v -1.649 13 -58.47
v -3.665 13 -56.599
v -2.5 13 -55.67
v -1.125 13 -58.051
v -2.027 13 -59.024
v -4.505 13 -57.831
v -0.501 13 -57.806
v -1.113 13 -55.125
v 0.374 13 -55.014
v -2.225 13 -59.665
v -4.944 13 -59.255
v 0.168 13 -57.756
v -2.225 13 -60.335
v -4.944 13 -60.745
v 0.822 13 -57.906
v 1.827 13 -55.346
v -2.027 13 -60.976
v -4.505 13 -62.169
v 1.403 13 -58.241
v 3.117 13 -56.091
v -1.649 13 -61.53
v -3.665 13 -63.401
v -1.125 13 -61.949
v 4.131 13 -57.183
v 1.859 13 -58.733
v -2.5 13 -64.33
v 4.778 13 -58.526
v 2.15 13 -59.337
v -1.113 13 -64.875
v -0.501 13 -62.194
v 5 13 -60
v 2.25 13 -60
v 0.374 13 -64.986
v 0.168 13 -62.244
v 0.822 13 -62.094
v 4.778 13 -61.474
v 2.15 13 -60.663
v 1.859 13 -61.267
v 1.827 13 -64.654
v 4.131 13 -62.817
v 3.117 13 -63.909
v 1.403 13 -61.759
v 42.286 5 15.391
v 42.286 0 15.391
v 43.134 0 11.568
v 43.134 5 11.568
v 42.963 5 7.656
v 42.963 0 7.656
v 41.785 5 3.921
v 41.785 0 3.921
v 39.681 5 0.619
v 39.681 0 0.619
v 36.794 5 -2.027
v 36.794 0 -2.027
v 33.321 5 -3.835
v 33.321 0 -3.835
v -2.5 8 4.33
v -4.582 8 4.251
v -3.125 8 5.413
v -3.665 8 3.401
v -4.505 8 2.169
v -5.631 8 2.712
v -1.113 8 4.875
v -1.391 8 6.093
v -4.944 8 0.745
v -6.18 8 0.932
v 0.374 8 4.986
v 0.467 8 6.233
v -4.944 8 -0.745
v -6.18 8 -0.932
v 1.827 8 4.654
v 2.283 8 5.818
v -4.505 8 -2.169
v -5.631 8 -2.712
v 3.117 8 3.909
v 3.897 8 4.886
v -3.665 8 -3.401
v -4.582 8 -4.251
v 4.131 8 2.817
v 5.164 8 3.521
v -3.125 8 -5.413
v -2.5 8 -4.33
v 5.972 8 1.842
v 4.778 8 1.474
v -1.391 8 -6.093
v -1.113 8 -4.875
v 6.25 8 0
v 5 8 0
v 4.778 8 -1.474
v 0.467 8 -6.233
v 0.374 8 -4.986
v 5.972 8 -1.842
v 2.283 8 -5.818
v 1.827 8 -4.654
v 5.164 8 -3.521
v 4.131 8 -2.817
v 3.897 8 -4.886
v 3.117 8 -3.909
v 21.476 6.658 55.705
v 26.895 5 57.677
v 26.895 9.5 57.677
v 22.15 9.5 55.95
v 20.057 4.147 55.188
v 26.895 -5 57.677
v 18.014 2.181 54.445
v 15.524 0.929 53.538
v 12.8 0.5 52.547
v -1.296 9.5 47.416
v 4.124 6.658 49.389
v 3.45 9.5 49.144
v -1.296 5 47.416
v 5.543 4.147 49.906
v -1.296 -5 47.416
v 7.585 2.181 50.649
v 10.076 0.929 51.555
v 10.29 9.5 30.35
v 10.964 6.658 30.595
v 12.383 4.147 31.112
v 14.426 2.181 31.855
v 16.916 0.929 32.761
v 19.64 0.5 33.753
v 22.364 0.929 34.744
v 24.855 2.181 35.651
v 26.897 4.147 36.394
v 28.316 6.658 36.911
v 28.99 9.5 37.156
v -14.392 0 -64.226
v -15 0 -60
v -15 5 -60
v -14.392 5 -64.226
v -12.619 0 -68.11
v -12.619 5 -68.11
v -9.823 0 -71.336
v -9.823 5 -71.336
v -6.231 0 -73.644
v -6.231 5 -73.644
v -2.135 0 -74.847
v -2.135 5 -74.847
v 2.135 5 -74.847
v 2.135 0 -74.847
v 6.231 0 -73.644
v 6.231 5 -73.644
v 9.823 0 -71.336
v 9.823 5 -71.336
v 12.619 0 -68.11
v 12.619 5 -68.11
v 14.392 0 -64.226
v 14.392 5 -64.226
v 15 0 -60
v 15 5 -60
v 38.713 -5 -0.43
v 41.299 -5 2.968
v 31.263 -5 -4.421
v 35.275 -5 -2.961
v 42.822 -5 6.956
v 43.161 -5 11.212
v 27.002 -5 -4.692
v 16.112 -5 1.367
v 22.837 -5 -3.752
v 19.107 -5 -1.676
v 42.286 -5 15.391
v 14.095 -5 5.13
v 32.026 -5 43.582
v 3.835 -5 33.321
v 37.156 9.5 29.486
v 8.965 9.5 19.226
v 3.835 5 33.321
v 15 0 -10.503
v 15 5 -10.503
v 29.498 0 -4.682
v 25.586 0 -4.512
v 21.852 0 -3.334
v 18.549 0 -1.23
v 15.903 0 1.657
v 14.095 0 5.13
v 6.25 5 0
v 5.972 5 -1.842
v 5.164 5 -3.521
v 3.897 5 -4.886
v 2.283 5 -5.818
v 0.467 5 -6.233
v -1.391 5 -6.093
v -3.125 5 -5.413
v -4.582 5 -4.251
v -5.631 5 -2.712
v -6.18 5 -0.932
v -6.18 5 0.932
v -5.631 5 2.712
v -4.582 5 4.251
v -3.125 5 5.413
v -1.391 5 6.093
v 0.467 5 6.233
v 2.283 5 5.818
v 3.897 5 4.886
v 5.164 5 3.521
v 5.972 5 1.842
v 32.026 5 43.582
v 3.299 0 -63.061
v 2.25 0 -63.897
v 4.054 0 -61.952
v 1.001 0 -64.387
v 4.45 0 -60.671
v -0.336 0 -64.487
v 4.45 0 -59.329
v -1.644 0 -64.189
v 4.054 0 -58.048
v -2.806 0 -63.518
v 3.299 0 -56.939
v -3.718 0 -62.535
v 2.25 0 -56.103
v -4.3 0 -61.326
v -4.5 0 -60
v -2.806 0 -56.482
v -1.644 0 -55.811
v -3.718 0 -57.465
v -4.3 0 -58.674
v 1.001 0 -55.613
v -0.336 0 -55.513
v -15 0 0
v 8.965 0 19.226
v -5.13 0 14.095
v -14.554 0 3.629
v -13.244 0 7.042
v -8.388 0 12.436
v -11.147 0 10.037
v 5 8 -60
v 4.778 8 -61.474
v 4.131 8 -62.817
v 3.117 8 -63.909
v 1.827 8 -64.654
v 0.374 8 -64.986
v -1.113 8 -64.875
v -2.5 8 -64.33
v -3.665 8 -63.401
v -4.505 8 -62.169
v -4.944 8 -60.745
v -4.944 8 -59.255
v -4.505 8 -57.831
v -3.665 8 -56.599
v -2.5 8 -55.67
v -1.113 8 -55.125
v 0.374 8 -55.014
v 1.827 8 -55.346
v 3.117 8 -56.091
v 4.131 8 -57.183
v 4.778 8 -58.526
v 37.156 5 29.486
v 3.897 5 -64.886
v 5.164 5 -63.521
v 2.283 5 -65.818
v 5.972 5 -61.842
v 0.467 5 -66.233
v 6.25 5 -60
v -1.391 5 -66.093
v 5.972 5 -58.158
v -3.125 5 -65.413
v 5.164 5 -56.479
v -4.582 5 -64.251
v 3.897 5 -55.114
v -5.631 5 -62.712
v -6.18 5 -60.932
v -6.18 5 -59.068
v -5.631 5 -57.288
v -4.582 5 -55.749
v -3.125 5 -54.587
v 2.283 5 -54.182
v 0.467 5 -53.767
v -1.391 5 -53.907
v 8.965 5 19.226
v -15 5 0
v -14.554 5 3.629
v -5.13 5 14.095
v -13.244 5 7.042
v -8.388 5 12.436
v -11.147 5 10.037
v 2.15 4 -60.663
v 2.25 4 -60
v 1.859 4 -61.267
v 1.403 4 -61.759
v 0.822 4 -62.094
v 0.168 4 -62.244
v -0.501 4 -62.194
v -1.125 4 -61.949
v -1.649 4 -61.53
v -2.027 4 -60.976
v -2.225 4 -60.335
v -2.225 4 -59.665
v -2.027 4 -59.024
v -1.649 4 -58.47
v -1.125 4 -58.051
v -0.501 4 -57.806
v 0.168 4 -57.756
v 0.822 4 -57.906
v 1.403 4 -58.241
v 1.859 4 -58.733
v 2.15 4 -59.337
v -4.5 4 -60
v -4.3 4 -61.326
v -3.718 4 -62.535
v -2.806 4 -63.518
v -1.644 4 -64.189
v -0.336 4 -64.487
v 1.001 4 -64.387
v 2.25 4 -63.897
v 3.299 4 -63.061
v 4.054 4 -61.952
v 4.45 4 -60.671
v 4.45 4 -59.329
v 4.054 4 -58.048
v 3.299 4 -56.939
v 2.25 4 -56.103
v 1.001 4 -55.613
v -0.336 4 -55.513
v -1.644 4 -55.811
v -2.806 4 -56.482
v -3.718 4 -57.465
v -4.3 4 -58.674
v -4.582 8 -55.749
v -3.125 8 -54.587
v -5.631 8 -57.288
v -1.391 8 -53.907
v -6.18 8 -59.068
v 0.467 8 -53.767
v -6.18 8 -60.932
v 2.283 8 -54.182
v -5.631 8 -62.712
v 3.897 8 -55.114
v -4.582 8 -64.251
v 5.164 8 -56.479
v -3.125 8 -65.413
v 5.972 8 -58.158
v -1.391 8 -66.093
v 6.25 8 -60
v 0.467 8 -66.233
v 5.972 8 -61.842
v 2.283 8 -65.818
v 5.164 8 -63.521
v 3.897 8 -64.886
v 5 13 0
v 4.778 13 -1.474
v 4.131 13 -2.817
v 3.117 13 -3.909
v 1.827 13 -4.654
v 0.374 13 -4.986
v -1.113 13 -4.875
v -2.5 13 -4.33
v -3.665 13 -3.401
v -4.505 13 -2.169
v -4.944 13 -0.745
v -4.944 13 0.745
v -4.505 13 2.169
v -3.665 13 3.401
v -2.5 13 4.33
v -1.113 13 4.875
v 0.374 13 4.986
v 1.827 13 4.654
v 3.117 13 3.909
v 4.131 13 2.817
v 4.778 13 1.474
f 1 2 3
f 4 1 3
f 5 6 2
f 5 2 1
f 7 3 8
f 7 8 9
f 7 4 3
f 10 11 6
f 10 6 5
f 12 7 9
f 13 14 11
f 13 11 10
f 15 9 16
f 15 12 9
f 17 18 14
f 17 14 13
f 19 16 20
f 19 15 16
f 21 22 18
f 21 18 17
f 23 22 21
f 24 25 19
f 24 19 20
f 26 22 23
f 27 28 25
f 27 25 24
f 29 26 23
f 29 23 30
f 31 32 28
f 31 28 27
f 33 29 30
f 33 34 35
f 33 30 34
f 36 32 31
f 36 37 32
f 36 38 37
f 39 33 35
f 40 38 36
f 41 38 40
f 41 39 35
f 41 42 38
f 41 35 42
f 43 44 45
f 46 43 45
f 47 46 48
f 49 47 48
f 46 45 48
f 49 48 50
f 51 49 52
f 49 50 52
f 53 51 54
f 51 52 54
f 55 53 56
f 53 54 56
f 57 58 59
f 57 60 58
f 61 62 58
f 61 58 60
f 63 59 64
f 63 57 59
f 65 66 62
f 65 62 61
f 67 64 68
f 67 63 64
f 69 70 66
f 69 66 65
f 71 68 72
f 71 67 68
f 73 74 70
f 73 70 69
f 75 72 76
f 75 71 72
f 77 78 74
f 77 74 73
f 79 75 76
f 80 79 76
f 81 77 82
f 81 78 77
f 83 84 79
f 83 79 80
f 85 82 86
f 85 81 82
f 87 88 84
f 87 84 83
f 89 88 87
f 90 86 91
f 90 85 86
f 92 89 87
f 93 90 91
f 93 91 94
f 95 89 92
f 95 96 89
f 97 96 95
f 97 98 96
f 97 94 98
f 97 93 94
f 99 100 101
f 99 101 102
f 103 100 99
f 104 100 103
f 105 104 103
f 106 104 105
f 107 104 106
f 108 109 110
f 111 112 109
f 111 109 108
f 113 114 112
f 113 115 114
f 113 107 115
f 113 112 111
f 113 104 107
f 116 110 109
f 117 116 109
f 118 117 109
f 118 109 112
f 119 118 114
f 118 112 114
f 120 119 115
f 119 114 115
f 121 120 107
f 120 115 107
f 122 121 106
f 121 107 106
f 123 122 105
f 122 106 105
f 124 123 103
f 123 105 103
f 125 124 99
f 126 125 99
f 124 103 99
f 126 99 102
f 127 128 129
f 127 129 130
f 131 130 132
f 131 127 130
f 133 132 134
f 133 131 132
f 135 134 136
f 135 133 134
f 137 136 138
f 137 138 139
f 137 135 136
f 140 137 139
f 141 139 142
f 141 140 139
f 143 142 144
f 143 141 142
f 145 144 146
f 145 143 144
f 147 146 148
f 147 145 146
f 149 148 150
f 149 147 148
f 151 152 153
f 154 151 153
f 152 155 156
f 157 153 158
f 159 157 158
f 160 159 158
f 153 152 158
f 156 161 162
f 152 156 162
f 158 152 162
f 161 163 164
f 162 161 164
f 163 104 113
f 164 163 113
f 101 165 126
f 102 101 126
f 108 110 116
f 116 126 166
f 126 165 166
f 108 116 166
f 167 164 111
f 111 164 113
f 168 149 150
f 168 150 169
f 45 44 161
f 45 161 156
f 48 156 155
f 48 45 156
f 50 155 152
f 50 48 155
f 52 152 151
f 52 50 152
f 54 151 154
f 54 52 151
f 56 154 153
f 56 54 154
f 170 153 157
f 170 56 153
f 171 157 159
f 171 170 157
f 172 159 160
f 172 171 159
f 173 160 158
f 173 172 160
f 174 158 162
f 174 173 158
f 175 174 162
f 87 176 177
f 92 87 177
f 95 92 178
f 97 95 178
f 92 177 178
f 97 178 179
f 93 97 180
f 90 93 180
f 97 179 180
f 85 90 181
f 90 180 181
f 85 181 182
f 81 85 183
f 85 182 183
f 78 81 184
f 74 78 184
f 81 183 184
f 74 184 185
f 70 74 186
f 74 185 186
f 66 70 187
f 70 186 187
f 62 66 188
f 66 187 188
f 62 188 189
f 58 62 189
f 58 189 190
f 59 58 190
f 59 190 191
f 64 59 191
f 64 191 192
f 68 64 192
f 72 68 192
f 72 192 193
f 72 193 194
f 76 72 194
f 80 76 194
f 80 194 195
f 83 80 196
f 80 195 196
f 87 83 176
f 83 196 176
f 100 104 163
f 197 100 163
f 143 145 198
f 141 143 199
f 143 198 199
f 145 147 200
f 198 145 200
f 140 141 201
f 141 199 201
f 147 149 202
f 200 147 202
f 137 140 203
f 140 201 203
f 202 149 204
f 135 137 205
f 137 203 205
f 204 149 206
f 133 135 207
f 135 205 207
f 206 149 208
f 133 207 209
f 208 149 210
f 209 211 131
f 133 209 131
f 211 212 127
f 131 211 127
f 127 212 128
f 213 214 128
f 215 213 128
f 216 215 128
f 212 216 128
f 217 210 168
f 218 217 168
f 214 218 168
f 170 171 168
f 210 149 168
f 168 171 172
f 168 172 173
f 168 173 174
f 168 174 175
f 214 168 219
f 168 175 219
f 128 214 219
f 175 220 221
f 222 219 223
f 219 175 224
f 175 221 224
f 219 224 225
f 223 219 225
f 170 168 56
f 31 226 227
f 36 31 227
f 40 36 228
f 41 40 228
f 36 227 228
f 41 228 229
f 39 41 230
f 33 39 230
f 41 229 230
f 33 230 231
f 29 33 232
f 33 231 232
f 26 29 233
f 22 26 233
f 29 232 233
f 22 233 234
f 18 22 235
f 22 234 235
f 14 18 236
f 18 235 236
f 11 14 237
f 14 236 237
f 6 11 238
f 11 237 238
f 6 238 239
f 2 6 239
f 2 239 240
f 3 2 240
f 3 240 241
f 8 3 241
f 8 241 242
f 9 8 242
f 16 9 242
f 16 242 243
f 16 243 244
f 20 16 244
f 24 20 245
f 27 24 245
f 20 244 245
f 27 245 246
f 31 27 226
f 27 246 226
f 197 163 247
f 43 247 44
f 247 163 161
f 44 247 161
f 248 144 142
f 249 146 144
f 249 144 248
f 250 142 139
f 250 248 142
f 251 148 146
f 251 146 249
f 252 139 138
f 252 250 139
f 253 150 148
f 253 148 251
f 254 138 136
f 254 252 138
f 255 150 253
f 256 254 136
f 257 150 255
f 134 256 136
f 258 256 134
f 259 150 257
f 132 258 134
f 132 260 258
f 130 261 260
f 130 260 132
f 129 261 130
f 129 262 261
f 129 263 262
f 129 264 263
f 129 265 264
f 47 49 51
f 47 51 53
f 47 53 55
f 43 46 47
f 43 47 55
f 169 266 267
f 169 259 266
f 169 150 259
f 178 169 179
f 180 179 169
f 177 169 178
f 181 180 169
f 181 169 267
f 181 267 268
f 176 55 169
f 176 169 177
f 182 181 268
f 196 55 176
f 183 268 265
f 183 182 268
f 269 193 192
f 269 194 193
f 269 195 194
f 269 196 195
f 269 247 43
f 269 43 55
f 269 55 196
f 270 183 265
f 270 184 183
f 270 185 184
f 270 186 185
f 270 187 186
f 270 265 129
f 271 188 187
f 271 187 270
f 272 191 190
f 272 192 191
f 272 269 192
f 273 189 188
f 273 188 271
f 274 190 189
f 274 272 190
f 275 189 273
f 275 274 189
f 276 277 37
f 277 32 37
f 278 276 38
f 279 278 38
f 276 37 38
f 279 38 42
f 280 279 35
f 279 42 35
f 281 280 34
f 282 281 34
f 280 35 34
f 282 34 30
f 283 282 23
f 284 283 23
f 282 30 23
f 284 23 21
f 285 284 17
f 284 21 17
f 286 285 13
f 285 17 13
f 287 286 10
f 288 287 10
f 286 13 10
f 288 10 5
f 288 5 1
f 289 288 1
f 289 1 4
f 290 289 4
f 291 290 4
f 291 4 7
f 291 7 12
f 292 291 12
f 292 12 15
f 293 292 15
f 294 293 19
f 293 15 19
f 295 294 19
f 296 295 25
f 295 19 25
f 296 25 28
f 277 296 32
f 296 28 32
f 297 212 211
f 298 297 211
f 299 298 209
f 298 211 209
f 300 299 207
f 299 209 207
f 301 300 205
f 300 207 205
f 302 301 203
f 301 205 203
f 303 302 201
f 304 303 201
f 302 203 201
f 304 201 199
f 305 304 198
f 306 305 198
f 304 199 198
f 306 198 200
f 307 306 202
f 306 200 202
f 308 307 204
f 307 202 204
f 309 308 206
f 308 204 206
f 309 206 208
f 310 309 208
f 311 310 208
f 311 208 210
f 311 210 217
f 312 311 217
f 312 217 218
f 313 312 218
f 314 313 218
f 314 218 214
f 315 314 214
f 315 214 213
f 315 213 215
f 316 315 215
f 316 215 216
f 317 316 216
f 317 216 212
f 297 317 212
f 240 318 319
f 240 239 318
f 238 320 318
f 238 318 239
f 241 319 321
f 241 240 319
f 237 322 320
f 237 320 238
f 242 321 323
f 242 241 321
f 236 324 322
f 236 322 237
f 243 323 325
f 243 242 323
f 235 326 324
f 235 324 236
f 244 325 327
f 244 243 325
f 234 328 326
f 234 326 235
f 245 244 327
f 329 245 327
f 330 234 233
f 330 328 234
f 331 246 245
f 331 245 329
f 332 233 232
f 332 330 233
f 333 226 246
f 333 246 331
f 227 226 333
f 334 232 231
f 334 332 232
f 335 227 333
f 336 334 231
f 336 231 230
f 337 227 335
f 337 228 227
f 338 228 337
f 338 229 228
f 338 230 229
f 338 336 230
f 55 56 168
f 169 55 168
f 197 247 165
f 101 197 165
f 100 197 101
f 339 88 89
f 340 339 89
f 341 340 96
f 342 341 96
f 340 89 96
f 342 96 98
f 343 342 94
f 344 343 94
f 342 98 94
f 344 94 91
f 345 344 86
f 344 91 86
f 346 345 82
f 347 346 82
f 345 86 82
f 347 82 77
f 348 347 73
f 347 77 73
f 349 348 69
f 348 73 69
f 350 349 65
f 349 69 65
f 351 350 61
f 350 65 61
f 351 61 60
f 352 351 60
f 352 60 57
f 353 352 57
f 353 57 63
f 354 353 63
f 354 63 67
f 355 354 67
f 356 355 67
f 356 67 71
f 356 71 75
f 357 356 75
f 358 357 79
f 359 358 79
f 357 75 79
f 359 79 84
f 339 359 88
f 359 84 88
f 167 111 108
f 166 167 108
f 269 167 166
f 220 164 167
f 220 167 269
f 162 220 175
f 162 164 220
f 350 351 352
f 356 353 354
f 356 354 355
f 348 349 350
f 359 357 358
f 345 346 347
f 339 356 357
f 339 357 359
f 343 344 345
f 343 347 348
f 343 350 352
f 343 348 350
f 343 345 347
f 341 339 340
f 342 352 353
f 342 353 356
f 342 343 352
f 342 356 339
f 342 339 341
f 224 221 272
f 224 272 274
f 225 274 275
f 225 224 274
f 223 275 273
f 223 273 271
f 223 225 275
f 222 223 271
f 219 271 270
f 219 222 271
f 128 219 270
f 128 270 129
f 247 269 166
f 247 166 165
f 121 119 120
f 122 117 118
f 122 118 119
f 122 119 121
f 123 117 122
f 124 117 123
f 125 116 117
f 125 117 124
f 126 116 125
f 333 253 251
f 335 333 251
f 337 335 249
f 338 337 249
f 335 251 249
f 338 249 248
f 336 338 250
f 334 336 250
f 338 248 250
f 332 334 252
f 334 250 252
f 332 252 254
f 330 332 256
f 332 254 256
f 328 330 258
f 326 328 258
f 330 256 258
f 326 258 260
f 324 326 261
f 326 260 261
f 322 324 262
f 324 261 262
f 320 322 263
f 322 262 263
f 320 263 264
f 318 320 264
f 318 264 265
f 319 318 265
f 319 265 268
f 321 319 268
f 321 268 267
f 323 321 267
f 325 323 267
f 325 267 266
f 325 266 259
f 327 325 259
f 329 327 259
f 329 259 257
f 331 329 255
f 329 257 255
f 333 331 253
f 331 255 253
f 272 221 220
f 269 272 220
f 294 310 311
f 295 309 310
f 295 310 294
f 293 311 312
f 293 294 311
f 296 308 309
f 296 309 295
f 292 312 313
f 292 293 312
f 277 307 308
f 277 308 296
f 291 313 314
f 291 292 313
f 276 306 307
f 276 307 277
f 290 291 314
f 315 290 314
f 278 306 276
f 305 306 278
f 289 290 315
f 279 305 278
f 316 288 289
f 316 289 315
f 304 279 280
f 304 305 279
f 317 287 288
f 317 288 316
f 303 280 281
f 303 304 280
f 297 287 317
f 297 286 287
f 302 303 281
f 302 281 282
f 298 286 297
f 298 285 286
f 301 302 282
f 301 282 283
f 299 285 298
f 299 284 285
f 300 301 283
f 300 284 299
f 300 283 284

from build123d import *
from build123d.topology import SkipClean

# Parameters (mm, degrees)
EXTRUDE_1_DEPTH              = 5
SKETCH_2_R                   = 6.25
EXTRUDE_2_DEPTH              = 3
SKETCH_3_R                   = 5
EXTRUDE_3_DEPTH              = 5
HOLE_WIZARD_M4_1_D           = 4.5
HOLE_WIZARD_M4_1_CBORE_D     = 9
HOLE_WIZARD_M4_1_CBORE_DEPTH = 4
EXTRUDE_4_DEPTH              = 5
EXTRUDE_5_DEPTH              = 5
EXTRUDE_5_DEPTH_BACK         = 5
EXTRUDE_6_DEPTH              = 4.5
SKETCH_15_R                  = 10
CUT_EXTRUDE_2_DEPTH          = 20


with BuildPart() as part:
    # 스케치1 → 보스-돌출1 (new body)
    with BuildSketch(Plane(origin=(0, 0, 0), x_dir=(1, 0, 0), z_dir=(0, 1, 0))):
        with BuildLine():
            Line((-15, 0), (-15, 60))
            ThreePointArc((-15, 60), (0, 75), (15, 60))
            Line((15, 60), (15, 0))
            ThreePointArc((15, 0), (0, -15), (-15, 0))
        make_face()
    extrude(amount=EXTRUDE_1_DEPTH)

    # 스케치2 → 보스-돌출2 (add)
    with BuildSketch(Plane(origin=(0, 5, 0), x_dir=(1, 0, 0), z_dir=(0, 1, 0))):
        with Locations((0, 60)):
            Circle(SKETCH_2_R)
        Circle(SKETCH_2_R)
    extrude(amount=EXTRUDE_2_DEPTH)

    # 스케치3 → 보스-돌출3 (add)
    with BuildSketch(Plane(origin=(0, 8, 0), x_dir=(1, 0, 0), z_dir=(0, 1, 0))):
        with Locations((0, 60)):
            Circle(SKETCH_3_R)
        Circle(SKETCH_3_R)
    extrude(amount=EXTRUDE_3_DEPTH)

    # M4 남비 머리 나사용 카운터보어1 (through all)
    with Locations(Plane(origin=(0, 0, 0), x_dir=(-1, 0, 0), z_dir=(0, -1, 0))):
        with Locations((0, 60), (0, -25)):
            CounterBoreHole(HOLE_WIZARD_M4_1_D / 2, HOLE_WIZARD_M4_1_CBORE_D / 2, HOLE_WIZARD_M4_1_CBORE_DEPTH)

    # 스케치8 → 보스-돌출4 (add)
    with BuildSketch(Plane.XZ):
        with BuildLine():
            Line((-5.13030215, 14.095389312), (23.060476474, 24.355993612))
            ThreePointArc((23.060476474, 24.355993612), (42.286167935, 15.39090645), (33.321080773, -3.834785012))
            Line((33.321080773, -3.834785012), (15, -10.503113073))
            Line((15, -10.503113073), (15, 0))
            ThreePointArc((15, 0), (8.603646545, 12.287280664), (-5.13030215, 14.095389312))
        make_face()
    extrude(amount=-EXTRUDE_4_DEPTH)

    # 스케치9 → 보스-돌출5 (add, two sides: drawn at the far end of the back side and taken through both)
    with SkipClean():  # the faces are left unmerged after this step: merging them gives an invalid solid
        with BuildSketch(Plane.XZ.offset(-EXTRUDE_5_DEPTH_BACK)):
            with BuildLine():
                Line((14.095389312, 5.13030215), (3.834785012, 33.321080773))
                Line((3.834785012, 33.321080773), (-1.295517138, 47.416470085))
                Line((-1.295517138, 47.416470085), (26.895261486, 57.677074385))
                Line((26.895261486, 57.677074385), (32.025563636, 43.581685073))
                Line((32.025563636, 43.581685073), (42.286167935, 15.39090645))
                ThreePointArc((42.286167935, 15.39090645), (33.321080773, -3.834785012), (14.095389312, 5.13030215))
            make_face()
        extrude(amount=EXTRUDE_5_DEPTH + EXTRUDE_5_DEPTH_BACK)

    # 스케치13 → 보스-돌출6 (add)
    with SkipClean():  # the faces are left unmerged after this step: merging them gives an invalid solid
        with BuildSketch(Plane(origin=(0, 5, 0), x_dir=(1, 0, 0), z_dir=(0, 1, 0))):
            Polygon((37.155865785, -29.486295761), (26.895261486, -57.677074385), (-1.295517138, -47.416470085), (8.965087162, -19.225691462), align=None)
        extrude(amount=EXTRUDE_6_DEPTH)

    # 스케치15 → 컷-돌출2 (cut)
    with SkipClean():  # the faces are left unmerged after this step: merging them gives an invalid solid
        with BuildSketch(Plane(origin=(-15.39090645, 0, 42.286167935), x_dir=(0.9396926207859084, 0, 0.3420201433256689), z_dir=(-0.3420201433256689, 0, 0.9396926207859084))):
            with Locations((30, 10.5)):
                Circle(SKETCH_15_R)
        extrude(amount=-CUT_EXTRUDE_2_DEPTH, mode=Mode.SUBTRACT)


solid = part.part
